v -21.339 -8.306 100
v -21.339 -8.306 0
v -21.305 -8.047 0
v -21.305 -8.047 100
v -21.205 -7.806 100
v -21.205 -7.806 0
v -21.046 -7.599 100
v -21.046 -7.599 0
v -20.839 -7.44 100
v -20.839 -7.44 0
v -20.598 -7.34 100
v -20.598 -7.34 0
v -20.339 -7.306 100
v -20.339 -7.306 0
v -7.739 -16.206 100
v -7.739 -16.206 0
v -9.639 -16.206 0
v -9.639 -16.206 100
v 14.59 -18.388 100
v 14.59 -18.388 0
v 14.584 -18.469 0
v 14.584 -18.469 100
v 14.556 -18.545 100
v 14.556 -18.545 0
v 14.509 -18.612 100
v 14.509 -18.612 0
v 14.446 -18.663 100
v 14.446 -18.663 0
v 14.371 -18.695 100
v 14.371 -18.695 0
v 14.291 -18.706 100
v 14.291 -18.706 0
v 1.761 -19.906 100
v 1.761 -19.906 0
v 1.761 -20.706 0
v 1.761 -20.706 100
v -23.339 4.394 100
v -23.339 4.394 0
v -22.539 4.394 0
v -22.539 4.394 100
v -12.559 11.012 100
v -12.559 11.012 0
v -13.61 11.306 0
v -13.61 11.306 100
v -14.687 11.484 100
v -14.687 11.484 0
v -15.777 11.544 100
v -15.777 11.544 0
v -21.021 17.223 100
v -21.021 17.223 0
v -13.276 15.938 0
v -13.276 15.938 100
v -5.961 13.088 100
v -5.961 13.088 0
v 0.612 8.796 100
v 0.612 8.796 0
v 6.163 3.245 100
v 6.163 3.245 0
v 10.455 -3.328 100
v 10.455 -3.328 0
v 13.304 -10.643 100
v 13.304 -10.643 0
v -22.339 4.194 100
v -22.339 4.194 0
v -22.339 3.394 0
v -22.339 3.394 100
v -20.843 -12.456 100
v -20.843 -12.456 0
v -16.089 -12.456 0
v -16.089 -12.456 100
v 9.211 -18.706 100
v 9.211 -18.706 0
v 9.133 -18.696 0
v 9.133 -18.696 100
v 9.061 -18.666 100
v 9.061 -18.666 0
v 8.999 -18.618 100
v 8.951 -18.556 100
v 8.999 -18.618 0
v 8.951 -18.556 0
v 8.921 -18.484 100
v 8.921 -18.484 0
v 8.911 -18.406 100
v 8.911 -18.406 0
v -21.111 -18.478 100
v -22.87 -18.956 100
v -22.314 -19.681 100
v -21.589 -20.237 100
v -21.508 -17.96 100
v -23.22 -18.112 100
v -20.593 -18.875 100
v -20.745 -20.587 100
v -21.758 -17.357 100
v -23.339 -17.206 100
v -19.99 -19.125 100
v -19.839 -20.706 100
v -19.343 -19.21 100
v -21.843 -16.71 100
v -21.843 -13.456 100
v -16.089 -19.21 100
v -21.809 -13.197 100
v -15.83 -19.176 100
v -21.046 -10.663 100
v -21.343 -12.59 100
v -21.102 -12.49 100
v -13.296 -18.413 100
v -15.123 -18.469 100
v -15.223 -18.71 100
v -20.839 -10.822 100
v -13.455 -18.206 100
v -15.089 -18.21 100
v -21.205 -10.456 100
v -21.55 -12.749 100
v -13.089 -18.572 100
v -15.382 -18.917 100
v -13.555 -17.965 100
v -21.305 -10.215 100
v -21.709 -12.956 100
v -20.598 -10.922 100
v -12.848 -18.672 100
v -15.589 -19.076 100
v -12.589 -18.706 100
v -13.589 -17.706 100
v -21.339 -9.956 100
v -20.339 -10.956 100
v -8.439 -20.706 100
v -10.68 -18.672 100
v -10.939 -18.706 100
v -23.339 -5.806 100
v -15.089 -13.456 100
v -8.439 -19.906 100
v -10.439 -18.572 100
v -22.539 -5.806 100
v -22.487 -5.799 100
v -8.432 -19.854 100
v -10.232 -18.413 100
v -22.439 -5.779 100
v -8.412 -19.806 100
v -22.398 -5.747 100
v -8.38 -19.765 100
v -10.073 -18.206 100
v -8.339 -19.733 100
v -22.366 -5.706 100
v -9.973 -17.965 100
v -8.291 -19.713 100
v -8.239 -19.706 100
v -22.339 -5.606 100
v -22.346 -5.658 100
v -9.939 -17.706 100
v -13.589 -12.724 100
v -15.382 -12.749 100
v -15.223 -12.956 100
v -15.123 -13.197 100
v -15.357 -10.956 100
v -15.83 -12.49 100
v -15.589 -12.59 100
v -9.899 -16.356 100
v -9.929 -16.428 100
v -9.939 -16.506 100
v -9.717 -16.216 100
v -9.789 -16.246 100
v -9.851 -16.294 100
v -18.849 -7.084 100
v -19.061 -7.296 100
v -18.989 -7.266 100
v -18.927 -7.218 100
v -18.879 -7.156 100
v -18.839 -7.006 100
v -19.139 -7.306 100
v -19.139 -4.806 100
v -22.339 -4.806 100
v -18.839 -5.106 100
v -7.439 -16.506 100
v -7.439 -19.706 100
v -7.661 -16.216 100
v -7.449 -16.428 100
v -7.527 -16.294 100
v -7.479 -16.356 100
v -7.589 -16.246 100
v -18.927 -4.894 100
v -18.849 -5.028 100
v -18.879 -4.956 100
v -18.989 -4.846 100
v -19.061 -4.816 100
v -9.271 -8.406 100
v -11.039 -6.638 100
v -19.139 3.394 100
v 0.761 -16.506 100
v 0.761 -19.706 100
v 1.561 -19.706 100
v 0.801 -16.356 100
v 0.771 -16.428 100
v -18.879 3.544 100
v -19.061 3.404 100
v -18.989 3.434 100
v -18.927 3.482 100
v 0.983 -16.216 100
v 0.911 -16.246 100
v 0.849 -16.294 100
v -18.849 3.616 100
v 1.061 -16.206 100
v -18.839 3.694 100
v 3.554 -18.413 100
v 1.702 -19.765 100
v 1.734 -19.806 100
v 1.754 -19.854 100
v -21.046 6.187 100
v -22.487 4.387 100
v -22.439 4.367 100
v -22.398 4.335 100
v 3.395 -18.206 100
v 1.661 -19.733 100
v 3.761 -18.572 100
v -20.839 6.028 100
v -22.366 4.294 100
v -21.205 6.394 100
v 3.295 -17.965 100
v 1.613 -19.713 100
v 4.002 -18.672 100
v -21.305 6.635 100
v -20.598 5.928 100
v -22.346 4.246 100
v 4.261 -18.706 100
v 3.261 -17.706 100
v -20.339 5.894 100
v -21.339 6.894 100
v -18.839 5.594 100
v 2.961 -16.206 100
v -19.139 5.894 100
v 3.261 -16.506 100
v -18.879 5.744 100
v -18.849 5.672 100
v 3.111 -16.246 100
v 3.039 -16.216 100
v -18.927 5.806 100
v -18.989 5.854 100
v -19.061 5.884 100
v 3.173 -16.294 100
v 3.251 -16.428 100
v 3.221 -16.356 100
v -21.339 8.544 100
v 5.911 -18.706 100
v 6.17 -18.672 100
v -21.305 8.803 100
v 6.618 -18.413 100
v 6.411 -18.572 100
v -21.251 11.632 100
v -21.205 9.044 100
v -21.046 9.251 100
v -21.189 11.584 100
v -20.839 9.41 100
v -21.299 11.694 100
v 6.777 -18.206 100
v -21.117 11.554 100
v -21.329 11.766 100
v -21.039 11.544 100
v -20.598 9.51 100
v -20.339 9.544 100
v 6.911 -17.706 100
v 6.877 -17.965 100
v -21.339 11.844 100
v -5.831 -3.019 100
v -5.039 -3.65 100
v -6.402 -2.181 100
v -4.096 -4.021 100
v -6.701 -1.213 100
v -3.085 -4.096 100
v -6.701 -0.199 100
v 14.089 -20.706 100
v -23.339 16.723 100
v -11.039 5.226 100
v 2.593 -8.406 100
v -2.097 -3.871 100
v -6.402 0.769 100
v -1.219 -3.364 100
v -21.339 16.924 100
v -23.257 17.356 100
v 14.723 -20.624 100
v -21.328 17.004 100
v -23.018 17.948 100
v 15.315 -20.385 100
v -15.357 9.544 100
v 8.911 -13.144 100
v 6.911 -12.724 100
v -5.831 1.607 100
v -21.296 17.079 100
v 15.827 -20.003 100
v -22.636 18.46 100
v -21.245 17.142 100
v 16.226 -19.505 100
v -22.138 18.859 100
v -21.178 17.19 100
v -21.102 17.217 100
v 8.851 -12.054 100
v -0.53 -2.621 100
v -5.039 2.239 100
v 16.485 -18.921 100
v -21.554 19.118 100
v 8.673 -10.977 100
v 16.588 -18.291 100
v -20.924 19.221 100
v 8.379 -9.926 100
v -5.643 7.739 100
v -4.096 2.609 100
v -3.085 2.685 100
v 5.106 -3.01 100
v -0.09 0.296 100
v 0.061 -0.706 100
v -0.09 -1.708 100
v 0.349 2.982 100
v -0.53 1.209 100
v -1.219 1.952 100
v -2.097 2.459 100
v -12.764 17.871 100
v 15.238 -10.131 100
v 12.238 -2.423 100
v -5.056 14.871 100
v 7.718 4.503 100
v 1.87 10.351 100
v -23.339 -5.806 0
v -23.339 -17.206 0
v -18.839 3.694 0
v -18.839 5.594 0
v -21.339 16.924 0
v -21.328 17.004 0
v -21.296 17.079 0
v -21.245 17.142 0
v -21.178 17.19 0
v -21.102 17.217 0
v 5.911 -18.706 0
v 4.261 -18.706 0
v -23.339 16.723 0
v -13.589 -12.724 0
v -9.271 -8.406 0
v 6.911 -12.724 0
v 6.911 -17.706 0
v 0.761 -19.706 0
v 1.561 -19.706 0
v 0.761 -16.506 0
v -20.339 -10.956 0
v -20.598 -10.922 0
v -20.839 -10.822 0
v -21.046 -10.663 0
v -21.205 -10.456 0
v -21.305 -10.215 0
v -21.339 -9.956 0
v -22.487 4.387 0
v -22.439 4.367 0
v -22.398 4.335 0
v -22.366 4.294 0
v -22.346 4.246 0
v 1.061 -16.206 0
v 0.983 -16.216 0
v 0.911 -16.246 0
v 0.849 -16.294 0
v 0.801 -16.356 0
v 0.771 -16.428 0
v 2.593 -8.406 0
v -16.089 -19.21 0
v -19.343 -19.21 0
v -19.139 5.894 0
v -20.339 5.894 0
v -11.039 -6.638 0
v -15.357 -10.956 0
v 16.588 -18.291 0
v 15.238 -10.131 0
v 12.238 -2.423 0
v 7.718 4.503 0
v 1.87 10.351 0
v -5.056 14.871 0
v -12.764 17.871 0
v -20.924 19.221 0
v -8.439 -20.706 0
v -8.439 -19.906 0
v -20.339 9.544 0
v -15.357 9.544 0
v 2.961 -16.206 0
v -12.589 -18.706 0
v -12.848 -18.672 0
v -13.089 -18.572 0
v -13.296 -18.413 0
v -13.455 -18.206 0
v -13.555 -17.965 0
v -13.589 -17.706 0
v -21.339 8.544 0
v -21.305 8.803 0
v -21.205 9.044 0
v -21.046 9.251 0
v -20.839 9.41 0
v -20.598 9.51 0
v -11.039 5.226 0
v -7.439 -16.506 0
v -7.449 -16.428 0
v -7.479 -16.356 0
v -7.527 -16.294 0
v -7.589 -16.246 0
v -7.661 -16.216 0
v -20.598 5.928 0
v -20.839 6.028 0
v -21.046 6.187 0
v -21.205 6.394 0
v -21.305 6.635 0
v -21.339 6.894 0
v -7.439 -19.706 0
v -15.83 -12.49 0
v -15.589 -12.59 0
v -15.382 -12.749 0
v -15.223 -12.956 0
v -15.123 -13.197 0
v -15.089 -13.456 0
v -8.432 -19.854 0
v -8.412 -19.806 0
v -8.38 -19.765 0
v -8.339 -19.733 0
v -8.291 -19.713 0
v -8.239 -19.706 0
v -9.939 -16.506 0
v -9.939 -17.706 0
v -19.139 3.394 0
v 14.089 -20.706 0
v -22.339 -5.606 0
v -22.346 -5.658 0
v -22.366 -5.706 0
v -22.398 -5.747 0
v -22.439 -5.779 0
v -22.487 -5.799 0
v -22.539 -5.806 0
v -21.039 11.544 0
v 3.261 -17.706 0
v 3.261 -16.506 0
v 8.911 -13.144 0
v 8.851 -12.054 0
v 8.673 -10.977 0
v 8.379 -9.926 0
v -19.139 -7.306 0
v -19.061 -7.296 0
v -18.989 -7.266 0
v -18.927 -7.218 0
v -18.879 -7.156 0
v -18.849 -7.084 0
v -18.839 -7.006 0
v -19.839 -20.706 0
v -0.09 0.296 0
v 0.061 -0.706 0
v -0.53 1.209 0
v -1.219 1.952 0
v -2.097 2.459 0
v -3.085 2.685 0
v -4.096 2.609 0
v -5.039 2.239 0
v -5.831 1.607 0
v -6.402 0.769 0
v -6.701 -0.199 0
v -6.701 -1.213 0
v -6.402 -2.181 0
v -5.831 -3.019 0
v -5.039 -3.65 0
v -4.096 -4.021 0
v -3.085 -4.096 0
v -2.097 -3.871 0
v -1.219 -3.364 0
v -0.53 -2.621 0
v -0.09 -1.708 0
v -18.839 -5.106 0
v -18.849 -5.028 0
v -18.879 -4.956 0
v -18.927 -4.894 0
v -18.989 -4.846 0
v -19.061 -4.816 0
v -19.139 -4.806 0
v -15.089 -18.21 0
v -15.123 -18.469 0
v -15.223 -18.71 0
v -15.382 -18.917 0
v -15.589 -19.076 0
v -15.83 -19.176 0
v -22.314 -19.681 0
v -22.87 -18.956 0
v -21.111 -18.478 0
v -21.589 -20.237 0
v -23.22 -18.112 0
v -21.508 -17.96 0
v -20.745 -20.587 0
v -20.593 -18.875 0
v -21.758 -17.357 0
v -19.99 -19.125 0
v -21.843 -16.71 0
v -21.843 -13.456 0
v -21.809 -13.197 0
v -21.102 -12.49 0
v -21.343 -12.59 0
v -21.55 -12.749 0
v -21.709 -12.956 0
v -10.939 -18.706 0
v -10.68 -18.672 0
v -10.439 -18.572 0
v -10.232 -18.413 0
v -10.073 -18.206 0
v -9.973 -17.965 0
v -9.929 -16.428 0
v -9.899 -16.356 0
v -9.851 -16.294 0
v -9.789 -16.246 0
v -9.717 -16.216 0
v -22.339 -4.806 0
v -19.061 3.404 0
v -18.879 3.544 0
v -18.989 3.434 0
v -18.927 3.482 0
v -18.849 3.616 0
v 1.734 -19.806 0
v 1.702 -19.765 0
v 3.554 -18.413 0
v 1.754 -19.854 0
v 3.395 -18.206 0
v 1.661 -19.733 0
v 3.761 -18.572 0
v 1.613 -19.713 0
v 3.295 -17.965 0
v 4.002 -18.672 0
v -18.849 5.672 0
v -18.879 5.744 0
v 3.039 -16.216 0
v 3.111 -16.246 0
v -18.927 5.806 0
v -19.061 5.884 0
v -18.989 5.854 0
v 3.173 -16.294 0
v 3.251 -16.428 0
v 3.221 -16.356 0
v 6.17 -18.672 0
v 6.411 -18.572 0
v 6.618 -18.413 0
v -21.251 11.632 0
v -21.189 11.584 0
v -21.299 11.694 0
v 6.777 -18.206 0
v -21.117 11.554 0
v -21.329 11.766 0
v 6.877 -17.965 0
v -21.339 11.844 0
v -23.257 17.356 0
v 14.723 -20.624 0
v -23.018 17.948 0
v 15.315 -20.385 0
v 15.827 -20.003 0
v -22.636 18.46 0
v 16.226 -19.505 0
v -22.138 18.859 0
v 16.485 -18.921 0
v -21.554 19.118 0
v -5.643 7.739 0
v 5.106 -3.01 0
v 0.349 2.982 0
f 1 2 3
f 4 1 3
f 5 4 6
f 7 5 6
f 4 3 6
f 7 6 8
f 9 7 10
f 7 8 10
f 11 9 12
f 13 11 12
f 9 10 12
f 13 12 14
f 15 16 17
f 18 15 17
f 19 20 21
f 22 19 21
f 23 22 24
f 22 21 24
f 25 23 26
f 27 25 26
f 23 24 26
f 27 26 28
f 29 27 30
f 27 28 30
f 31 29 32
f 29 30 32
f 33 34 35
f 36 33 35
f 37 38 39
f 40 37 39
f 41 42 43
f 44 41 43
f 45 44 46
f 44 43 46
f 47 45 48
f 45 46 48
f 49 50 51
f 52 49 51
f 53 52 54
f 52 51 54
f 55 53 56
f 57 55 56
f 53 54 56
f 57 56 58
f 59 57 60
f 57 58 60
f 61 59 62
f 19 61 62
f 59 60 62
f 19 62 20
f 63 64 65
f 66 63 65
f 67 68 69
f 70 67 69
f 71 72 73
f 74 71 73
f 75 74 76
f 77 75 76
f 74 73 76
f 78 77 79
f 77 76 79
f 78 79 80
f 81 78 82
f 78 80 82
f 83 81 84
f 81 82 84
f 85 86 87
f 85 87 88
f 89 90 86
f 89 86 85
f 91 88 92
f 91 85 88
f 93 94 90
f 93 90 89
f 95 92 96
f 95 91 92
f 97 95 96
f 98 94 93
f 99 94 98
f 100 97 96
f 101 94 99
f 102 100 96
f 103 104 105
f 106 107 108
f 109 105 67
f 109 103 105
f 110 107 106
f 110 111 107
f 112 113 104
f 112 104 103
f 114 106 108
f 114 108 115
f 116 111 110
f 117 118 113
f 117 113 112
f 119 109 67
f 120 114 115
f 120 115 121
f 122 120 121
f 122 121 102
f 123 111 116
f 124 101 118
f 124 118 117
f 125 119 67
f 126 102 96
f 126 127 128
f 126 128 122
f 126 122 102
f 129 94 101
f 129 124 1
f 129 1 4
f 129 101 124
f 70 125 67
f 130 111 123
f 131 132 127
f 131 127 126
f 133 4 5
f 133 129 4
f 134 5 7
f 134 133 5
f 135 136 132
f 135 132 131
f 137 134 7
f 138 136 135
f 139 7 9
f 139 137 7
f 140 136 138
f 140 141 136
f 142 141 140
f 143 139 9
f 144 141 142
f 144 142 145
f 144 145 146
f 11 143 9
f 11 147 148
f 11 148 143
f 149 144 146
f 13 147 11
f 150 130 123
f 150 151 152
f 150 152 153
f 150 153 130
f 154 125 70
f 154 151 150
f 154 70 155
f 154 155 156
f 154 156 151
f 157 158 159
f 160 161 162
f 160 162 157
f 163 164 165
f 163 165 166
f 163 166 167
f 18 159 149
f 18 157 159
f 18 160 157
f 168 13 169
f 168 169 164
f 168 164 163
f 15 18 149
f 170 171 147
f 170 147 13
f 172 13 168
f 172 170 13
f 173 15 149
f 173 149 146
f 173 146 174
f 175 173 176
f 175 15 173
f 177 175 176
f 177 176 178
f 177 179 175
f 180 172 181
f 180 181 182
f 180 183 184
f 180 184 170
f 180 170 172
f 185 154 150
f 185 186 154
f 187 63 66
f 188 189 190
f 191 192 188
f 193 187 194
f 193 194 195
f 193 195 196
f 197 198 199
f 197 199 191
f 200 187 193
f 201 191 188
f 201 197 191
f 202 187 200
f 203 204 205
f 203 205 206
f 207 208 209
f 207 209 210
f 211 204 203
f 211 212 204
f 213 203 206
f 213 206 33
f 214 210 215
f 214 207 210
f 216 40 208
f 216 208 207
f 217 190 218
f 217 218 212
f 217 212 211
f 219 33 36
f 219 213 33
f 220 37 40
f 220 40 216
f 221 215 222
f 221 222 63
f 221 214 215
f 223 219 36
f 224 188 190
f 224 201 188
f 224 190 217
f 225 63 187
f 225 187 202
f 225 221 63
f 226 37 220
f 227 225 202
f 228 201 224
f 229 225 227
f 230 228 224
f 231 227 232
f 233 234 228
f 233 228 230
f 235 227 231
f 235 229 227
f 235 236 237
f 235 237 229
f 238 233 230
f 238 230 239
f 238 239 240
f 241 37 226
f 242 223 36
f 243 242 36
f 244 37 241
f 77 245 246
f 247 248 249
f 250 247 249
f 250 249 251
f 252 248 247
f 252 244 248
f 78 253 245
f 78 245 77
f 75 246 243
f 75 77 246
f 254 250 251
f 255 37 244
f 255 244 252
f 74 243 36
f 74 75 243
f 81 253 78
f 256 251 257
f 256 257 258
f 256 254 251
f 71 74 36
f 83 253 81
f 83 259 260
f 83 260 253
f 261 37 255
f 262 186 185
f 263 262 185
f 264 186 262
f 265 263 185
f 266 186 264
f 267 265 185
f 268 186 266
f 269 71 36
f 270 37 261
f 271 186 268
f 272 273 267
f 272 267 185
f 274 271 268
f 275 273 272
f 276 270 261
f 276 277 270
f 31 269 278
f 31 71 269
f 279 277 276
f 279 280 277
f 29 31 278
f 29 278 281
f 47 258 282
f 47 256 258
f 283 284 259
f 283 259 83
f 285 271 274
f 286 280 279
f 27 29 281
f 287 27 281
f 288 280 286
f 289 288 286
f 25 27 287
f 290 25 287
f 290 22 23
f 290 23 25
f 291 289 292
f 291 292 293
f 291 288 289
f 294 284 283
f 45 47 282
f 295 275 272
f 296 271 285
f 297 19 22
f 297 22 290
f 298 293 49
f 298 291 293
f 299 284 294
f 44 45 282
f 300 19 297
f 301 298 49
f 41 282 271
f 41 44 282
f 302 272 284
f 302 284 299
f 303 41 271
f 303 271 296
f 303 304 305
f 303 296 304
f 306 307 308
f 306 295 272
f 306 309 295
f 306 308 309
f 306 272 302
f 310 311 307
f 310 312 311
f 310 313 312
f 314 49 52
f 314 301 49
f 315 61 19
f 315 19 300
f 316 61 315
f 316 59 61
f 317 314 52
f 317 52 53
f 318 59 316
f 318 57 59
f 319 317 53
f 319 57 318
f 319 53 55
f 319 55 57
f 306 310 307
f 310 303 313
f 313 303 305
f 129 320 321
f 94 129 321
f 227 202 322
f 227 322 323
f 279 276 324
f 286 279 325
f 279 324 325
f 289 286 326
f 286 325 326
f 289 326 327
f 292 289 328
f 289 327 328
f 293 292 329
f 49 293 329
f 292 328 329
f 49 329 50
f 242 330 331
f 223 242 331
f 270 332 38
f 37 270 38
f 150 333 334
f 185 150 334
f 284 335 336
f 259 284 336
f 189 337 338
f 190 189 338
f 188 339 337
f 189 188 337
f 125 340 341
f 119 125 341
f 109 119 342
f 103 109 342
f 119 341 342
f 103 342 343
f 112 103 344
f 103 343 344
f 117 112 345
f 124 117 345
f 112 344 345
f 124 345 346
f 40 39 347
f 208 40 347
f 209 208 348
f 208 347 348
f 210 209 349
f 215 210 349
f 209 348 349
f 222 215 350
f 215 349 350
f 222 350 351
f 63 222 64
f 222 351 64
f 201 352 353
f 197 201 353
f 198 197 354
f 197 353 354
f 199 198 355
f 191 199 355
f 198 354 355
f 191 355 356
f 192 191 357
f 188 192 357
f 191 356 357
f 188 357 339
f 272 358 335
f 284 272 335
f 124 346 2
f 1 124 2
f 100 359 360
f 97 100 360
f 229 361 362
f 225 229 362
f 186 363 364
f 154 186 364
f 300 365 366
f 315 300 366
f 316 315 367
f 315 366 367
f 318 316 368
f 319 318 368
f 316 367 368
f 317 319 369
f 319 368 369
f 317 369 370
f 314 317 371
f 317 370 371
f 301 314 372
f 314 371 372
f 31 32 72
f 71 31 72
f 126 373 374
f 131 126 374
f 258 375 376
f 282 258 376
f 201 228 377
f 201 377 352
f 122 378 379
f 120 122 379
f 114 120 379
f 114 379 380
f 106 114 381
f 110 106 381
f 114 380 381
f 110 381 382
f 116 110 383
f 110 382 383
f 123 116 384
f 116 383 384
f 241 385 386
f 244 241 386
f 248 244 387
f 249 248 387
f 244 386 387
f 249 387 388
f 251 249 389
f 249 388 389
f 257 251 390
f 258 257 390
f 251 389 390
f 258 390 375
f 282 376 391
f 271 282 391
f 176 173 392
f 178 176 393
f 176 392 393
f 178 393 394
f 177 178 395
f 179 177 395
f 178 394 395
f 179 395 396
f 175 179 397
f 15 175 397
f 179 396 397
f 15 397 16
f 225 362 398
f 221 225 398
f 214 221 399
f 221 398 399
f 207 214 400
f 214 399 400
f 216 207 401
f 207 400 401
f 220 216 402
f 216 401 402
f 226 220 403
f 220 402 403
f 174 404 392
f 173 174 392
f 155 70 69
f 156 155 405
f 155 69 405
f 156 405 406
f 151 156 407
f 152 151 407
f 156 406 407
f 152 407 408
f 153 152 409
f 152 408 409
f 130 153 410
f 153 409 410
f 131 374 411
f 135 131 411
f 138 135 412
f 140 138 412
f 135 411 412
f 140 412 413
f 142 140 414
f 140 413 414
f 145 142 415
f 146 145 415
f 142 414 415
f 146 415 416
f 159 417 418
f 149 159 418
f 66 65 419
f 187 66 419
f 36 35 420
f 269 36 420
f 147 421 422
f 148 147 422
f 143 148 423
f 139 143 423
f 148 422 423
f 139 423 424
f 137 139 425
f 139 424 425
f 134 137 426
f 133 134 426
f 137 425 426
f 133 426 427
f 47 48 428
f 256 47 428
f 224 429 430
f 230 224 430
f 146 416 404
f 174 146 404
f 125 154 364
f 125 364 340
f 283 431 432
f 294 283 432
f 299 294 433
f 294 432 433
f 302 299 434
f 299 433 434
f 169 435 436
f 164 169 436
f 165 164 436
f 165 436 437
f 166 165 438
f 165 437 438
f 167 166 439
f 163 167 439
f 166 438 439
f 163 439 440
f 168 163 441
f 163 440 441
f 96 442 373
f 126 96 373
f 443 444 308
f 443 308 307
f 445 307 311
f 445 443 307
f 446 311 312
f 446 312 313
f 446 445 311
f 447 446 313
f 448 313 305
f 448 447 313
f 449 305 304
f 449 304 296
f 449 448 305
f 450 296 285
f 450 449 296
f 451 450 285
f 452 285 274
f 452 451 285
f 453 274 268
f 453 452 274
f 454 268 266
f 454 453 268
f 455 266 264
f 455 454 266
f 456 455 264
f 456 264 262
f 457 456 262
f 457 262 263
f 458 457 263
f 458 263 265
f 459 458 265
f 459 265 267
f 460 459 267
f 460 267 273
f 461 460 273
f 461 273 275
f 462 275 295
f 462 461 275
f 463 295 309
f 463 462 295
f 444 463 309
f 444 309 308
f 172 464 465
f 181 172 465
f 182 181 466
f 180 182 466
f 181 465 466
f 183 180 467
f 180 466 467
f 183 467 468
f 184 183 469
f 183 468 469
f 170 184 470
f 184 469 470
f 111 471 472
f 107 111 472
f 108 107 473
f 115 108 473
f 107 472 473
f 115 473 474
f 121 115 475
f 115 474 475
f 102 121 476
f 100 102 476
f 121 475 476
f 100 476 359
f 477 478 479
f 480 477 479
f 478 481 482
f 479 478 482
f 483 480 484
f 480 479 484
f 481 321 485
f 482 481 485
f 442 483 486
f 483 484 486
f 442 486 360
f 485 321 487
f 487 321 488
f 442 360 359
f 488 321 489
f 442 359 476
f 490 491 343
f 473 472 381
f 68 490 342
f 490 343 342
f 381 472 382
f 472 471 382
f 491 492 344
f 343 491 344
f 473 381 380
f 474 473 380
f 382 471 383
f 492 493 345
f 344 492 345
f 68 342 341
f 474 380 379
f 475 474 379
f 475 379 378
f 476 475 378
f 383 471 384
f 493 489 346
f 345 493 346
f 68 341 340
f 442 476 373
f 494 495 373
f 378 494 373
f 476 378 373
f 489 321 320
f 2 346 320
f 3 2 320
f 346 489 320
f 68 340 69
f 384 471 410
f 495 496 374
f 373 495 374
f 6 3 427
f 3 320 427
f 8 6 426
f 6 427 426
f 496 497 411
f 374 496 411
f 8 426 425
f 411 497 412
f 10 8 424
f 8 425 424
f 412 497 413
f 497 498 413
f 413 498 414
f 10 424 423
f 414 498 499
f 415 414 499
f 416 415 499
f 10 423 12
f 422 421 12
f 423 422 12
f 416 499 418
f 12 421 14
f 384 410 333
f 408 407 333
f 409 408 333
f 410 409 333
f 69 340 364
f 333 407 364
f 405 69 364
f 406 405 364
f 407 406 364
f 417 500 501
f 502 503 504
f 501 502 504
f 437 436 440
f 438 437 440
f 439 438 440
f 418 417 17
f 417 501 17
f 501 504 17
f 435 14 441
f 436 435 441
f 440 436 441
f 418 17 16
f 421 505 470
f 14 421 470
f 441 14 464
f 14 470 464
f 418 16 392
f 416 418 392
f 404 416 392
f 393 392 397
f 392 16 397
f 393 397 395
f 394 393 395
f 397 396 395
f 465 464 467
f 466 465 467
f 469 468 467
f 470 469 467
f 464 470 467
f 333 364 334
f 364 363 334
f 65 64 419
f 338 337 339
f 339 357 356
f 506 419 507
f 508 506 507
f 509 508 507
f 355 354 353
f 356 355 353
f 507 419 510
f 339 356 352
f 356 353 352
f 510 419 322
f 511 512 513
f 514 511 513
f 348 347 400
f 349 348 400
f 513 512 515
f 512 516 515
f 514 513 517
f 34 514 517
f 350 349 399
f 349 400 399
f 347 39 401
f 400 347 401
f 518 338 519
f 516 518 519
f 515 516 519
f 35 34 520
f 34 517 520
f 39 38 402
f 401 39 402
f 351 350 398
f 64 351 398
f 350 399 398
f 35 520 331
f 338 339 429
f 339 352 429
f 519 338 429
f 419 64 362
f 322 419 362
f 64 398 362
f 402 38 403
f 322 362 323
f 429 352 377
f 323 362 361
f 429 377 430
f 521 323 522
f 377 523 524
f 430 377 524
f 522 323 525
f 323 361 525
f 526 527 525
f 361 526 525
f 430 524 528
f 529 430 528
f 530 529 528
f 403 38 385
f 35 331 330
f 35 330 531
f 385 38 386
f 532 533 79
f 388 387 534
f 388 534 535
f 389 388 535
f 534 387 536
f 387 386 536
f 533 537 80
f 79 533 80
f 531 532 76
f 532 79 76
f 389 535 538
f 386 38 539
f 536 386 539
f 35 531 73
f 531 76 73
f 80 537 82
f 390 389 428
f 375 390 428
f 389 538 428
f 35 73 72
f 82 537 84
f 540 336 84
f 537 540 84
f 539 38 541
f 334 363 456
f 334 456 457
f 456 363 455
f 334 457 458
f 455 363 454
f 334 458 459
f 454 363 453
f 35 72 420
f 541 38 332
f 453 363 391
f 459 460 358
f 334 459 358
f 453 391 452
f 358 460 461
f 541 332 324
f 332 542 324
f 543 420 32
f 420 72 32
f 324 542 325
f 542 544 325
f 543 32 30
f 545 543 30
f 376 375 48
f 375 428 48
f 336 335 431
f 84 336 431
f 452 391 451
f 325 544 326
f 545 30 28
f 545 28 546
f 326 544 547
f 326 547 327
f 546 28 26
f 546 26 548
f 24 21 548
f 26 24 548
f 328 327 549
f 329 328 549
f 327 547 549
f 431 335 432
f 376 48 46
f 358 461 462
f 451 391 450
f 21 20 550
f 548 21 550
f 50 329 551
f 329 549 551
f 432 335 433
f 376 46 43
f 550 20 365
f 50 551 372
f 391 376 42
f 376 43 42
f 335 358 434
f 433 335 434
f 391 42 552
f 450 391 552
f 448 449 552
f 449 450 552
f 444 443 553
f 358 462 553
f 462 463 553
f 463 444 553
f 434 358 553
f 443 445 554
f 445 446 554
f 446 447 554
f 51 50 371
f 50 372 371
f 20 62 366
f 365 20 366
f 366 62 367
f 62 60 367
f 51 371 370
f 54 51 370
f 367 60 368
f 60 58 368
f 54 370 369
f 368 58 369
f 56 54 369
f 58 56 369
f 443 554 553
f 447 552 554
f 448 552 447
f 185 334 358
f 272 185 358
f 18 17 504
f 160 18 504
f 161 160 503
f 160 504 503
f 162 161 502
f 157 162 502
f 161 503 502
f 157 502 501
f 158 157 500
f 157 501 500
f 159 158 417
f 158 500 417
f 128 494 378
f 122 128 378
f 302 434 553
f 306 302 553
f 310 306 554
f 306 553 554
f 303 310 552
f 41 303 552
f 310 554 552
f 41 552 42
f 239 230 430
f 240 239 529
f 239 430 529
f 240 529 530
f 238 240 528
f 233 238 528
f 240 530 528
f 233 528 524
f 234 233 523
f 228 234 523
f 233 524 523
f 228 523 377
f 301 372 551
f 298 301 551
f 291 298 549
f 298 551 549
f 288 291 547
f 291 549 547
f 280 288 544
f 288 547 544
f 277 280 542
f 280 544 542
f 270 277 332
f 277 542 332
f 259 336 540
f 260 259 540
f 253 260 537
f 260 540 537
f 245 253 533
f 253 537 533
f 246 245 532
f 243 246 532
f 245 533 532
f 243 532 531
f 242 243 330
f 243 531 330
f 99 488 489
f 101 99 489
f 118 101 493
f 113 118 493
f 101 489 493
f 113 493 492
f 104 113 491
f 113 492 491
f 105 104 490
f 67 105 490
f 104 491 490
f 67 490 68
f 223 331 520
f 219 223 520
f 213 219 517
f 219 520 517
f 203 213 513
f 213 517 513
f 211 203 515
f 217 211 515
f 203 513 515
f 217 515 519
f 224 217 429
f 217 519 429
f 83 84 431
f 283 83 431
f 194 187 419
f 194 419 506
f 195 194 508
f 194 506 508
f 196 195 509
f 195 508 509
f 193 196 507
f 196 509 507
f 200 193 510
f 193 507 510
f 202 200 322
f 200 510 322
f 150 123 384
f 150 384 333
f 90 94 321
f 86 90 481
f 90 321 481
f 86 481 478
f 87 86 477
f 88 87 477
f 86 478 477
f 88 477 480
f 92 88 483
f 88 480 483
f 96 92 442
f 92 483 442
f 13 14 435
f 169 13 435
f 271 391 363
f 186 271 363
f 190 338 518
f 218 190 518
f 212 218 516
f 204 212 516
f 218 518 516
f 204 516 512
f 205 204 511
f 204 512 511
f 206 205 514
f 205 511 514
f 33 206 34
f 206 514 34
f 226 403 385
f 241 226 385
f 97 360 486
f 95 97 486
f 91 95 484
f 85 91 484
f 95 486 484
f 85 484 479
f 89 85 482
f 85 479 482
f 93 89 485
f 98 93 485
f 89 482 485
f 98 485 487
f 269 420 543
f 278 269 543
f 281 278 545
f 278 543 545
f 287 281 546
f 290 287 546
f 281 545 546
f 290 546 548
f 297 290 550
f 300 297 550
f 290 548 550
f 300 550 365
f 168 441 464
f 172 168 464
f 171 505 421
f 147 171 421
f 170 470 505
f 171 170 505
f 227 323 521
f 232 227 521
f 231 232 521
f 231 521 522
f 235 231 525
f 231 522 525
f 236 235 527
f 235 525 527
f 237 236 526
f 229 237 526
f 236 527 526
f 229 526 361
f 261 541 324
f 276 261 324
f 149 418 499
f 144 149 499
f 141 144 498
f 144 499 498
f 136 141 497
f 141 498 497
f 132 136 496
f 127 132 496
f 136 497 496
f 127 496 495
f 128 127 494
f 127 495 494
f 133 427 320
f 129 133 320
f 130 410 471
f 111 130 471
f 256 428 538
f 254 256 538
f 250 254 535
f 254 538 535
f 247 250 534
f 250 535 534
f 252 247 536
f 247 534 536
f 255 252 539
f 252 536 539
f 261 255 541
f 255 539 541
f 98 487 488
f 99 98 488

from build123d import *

# Parameters (mm, degrees)
SKETCH_1_R      = 3.4
EXTRUDE_1_DEPTH = 100


with BuildPart() as part:
    # 草图1 → 凸台-拉伸1 (new body)
    with BuildSketch(Plane.XY):
        with BuildLine():
            Line((-23.338979522, 16.722515545), (-23.338979522, 4.394054978))
            Line((-23.338979522, 4.394054978), (-22.538979522, 4.394054978))
            ThreePointArc((-22.538979522, 4.394054978), (-22.397558165, 4.335476334), (-22.338979522, 4.194054978))
            Line((-22.338979522, 4.194054978), (-22.338979522, 3.394054978))
            Line((-22.338979522, 3.394054978), (-19.138979522, 3.394054978))
            ThreePointArc((-19.138979522, 3.394054978), (-18.926847487, 3.481922943), (-18.838979522, 3.694054978))
            Line((-18.838979522, 3.694054978), (-18.838979522, 5.594054978))
            ThreePointArc((-18.838979522, 5.594054978), (-18.926847487, 5.806187012), (-19.138979522, 5.894054978))
            Line((-19.138979522, 5.894054978), (-20.338979522, 5.894054978))
            ThreePointArc((-20.338979522, 5.894054978), (-21.046086303, 6.186948197), (-21.338979522, 6.894054978))
            Line((-21.338979522, 6.894054978), (-21.338979522, 8.544054978))
            ThreePointArc((-21.338979522, 8.544054978), (-21.046086303, 9.251161759), (-20.338979522, 9.544054978))
            Line((-20.338979522, 9.544054978), (-15.356746475, 9.544054978))
            Line((-15.356746475, 9.544054978), (-11.038979522, 5.226288025))
            Line((-11.038979522, 5.226288025), (-11.038979522, -6.638178069))
            Line((-11.038979522, -6.638178069), (-15.356746475, -10.955945022))
            Line((-15.356746475, -10.955945022), (-20.338979522, -10.955945022))
            ThreePointArc((-20.338979522, -10.955945022), (-21.046086303, -10.663051803), (-21.338979522, -9.955945022))
            Line((-21.338979522, -9.955945022), (-21.338979522, -8.305945022))
            ThreePointArc((-21.338979522, -8.305945022), (-21.046086303, -7.598838241), (-20.338979522, -7.305945022))
            Line((-20.338979522, -7.305945022), (-19.138979522, -7.305945022))
            ThreePointArc((-19.138979522, -7.305945022), (-18.926847487, -7.218077057), (-18.838979522, -7.005945022))
            Line((-18.838979522, -7.005945022), (-18.838979522, -5.105945022))
            ThreePointArc((-18.838979522, -5.105945022), (-18.926847487, -4.893812988), (-19.138979522, -4.805945022))
            Line((-19.138979522, -4.805945022), (-22.338979522, -4.805945022))
            Line((-22.338979522, -4.805945022), (-22.338979522, -5.605945022))
            ThreePointArc((-22.338979522, -5.605945022), (-22.397558165, -5.747366379), (-22.538979522, -5.805945022))
            Line((-22.538979522, -5.805945022), (-23.338979522, -5.805945022))
            Line((-23.338979522, -5.805945022), (-23.338979522, -17.205945022))
            ThreePointArc((-23.338979522, -17.205945022), (-22.313853256, -19.680818756), (-19.838979522, -20.705945022))
            Line((-19.838979522, -20.705945022), (-8.438979522, -20.705945022))
            Line((-8.438979522, -20.705945022), (-8.438979522, -19.905945022))
            ThreePointArc((-8.438979522, -19.905945022), (-8.380400878, -19.764523666), (-8.238979522, -19.705945022))
            Line((-8.238979522, -19.705945022), (-7.438979522, -19.705945022))
            Line((-7.438979522, -19.705945022), (-7.438979522, -16.505945022))
            ThreePointArc((-7.438979522, -16.505945022), (-7.526847487, -16.293812988), (-7.738979522, -16.205945022))
            Line((-7.738979522, -16.205945022), (-9.638979522, -16.205945022))
            ThreePointArc((-9.638979522, -16.205945022), (-9.851111556, -16.293812988), (-9.938979522, -16.505945022))
            Line((-9.938979522, -16.505945022), (-9.938979522, -17.705945022))
            ThreePointArc((-9.938979522, -17.705945022), (-10.231872741, -18.413051803), (-10.938979522, -18.705945022))
            Line((-10.938979522, -18.705945022), (-12.588979522, -18.705945022))
            ThreePointArc((-12.588979522, -18.705945022), (-13.296086303, -18.413051803), (-13.588979522, -17.705945022))
            Line((-13.588979522, -17.705945022), (-13.588979522, -12.723711975))
            Line((-13.588979522, -12.723711975), (-9.271212569, -8.405945022))
            Line((-9.271212569, -8.405945022), (2.593253525, -8.405945022))
            Line((2.593253525, -8.405945022), (6.911020478, -12.723711975))
            Line((6.911020478, -12.723711975), (6.911020478, -17.705945022))
            ThreePointArc((6.911020478, -17.705945022), (6.618127259, -18.413051803), (5.911020478, -18.705945022))
            Line((5.911020478, -18.705945022), (4.261020478, -18.705945022))
            ThreePointArc((4.261020478, -18.705945022), (3.553913697, -18.413051803), (3.261020478, -17.705945022))
            Line((3.261020478, -17.705945022), (3.261020478, -16.505945022))
            ThreePointArc((3.261020478, -16.505945022), (3.173152513, -16.293812988), (2.961020478, -16.205945022))
            Line((2.961020478, -16.205945022), (1.061020478, -16.205945022))
            ThreePointArc((1.061020478, -16.205945022), (0.848888444, -16.293812988), (0.761020478, -16.505945022))
            Line((0.761020478, -16.505945022), (0.761020478, -19.705945022))
            Line((0.761020478, -19.705945022), (1.561020478, -19.705945022))
            ThreePointArc((1.561020478, -19.705945022), (1.702441835, -19.764523666), (1.761020478, -19.905945022))
            Line((1.761020478, -19.905945022), (1.761020478, -20.705945022))
            Line((1.761020478, -20.705945022), (14.089481045, -20.705945022))
            ThreePointArc((14.089481045, -20.705945022), (15.826995028, -20.003455845), (16.588041197, -18.290781149))
            ThreePointArc((16.588041197, -18.290781149), (4.945291726, 7.578326225), (-20.923815648, 19.221075696))
            ThreePointArc((-20.923815648, 19.221075696), (-22.636490345, 18.460029528), (-23.338979522, 16.722515545))
        make_face()
        with Locations((-3.338979522, -0.705945022)):
            Circle(SKETCH_1_R, mode=Mode.SUBTRACT)
        with BuildLine():
            Line((-15.088979522, -13.455945022), (-15.088979522, -18.209945022))
            ThreePointArc((-15.088979522, -18.209945022), (-15.381872741, -18.917051803), (-16.088979522, -19.209945022))
            Line((-16.088979522, -19.209945022), (-19.342979522, -19.209945022))
            ThreePointArc((-19.342979522, -19.209945022), (-21.110746475, -18.477711975), (-21.842979522, -16.709945022))
            Line((-21.842979522, -16.709945022), (-21.842979522, -13.455945022))
            ThreePointArc((-21.842979522, -13.455945022), (-21.550086303, -12.748838241), (-20.842979522, -12.455945022))
            Line((-20.842979522, -12.455945022), (-16.088979522, -12.455945022))
            ThreePointArc((-16.088979522, -12.455945022), (-15.381872741, -12.748838241), (-15.088979522, -13.455945022))
        make_face(mode=Mode.SUBTRACT)
        with BuildLine():
            Line((-15.776737791, 11.544054978), (-21.038979522, 11.544054978))
            ThreePointArc((-21.038979522, 11.544054978), (-21.251111556, 11.631922943), (-21.338979522, 11.844054978))
            Line((-21.338979522, 11.844054978), (-21.338979522, 16.923830422))
            ThreePointArc((-21.338979522, 16.923830422), (-21.244538861, 17.142337534), (-21.020677134, 17.223271606))
            ThreePointArc((-21.020677134, 17.223271606), (3.531078163, 6.164112663), (14.590237107, -18.387642635))
            ThreePointArc((14.590237107, -18.387642635), (14.509303035, -18.611504361), (14.290795923, -18.705945022))
            Line((14.290795923, -18.705945022), (9.211020478, -18.705945022))
            ThreePointArc((9.211020478, -18.705945022), (8.998888444, -18.618077057), (8.911020478, -18.405945022))
            Line((8.911020478, -18.405945022), (8.911020478, -13.143703291))
            ThreePointArc((8.911020478, -13.143703291), (8.777145631, -11.512883109), (8.379105585, -9.925728086))
            ThreePointArc((8.379105585, -9.925728086), (0.349097648, 2.982132147), (-12.558762586, 11.012140084))
            ThreePointArc((-12.558762586, 11.012140084), (-14.145917608, 11.410180131), (-15.776737791, 11.544054978))
        make_face(mode=Mode.SUBTRACT)
    extrude(amount=EXTRUDE_1_DEPTH)


solid = part.part
